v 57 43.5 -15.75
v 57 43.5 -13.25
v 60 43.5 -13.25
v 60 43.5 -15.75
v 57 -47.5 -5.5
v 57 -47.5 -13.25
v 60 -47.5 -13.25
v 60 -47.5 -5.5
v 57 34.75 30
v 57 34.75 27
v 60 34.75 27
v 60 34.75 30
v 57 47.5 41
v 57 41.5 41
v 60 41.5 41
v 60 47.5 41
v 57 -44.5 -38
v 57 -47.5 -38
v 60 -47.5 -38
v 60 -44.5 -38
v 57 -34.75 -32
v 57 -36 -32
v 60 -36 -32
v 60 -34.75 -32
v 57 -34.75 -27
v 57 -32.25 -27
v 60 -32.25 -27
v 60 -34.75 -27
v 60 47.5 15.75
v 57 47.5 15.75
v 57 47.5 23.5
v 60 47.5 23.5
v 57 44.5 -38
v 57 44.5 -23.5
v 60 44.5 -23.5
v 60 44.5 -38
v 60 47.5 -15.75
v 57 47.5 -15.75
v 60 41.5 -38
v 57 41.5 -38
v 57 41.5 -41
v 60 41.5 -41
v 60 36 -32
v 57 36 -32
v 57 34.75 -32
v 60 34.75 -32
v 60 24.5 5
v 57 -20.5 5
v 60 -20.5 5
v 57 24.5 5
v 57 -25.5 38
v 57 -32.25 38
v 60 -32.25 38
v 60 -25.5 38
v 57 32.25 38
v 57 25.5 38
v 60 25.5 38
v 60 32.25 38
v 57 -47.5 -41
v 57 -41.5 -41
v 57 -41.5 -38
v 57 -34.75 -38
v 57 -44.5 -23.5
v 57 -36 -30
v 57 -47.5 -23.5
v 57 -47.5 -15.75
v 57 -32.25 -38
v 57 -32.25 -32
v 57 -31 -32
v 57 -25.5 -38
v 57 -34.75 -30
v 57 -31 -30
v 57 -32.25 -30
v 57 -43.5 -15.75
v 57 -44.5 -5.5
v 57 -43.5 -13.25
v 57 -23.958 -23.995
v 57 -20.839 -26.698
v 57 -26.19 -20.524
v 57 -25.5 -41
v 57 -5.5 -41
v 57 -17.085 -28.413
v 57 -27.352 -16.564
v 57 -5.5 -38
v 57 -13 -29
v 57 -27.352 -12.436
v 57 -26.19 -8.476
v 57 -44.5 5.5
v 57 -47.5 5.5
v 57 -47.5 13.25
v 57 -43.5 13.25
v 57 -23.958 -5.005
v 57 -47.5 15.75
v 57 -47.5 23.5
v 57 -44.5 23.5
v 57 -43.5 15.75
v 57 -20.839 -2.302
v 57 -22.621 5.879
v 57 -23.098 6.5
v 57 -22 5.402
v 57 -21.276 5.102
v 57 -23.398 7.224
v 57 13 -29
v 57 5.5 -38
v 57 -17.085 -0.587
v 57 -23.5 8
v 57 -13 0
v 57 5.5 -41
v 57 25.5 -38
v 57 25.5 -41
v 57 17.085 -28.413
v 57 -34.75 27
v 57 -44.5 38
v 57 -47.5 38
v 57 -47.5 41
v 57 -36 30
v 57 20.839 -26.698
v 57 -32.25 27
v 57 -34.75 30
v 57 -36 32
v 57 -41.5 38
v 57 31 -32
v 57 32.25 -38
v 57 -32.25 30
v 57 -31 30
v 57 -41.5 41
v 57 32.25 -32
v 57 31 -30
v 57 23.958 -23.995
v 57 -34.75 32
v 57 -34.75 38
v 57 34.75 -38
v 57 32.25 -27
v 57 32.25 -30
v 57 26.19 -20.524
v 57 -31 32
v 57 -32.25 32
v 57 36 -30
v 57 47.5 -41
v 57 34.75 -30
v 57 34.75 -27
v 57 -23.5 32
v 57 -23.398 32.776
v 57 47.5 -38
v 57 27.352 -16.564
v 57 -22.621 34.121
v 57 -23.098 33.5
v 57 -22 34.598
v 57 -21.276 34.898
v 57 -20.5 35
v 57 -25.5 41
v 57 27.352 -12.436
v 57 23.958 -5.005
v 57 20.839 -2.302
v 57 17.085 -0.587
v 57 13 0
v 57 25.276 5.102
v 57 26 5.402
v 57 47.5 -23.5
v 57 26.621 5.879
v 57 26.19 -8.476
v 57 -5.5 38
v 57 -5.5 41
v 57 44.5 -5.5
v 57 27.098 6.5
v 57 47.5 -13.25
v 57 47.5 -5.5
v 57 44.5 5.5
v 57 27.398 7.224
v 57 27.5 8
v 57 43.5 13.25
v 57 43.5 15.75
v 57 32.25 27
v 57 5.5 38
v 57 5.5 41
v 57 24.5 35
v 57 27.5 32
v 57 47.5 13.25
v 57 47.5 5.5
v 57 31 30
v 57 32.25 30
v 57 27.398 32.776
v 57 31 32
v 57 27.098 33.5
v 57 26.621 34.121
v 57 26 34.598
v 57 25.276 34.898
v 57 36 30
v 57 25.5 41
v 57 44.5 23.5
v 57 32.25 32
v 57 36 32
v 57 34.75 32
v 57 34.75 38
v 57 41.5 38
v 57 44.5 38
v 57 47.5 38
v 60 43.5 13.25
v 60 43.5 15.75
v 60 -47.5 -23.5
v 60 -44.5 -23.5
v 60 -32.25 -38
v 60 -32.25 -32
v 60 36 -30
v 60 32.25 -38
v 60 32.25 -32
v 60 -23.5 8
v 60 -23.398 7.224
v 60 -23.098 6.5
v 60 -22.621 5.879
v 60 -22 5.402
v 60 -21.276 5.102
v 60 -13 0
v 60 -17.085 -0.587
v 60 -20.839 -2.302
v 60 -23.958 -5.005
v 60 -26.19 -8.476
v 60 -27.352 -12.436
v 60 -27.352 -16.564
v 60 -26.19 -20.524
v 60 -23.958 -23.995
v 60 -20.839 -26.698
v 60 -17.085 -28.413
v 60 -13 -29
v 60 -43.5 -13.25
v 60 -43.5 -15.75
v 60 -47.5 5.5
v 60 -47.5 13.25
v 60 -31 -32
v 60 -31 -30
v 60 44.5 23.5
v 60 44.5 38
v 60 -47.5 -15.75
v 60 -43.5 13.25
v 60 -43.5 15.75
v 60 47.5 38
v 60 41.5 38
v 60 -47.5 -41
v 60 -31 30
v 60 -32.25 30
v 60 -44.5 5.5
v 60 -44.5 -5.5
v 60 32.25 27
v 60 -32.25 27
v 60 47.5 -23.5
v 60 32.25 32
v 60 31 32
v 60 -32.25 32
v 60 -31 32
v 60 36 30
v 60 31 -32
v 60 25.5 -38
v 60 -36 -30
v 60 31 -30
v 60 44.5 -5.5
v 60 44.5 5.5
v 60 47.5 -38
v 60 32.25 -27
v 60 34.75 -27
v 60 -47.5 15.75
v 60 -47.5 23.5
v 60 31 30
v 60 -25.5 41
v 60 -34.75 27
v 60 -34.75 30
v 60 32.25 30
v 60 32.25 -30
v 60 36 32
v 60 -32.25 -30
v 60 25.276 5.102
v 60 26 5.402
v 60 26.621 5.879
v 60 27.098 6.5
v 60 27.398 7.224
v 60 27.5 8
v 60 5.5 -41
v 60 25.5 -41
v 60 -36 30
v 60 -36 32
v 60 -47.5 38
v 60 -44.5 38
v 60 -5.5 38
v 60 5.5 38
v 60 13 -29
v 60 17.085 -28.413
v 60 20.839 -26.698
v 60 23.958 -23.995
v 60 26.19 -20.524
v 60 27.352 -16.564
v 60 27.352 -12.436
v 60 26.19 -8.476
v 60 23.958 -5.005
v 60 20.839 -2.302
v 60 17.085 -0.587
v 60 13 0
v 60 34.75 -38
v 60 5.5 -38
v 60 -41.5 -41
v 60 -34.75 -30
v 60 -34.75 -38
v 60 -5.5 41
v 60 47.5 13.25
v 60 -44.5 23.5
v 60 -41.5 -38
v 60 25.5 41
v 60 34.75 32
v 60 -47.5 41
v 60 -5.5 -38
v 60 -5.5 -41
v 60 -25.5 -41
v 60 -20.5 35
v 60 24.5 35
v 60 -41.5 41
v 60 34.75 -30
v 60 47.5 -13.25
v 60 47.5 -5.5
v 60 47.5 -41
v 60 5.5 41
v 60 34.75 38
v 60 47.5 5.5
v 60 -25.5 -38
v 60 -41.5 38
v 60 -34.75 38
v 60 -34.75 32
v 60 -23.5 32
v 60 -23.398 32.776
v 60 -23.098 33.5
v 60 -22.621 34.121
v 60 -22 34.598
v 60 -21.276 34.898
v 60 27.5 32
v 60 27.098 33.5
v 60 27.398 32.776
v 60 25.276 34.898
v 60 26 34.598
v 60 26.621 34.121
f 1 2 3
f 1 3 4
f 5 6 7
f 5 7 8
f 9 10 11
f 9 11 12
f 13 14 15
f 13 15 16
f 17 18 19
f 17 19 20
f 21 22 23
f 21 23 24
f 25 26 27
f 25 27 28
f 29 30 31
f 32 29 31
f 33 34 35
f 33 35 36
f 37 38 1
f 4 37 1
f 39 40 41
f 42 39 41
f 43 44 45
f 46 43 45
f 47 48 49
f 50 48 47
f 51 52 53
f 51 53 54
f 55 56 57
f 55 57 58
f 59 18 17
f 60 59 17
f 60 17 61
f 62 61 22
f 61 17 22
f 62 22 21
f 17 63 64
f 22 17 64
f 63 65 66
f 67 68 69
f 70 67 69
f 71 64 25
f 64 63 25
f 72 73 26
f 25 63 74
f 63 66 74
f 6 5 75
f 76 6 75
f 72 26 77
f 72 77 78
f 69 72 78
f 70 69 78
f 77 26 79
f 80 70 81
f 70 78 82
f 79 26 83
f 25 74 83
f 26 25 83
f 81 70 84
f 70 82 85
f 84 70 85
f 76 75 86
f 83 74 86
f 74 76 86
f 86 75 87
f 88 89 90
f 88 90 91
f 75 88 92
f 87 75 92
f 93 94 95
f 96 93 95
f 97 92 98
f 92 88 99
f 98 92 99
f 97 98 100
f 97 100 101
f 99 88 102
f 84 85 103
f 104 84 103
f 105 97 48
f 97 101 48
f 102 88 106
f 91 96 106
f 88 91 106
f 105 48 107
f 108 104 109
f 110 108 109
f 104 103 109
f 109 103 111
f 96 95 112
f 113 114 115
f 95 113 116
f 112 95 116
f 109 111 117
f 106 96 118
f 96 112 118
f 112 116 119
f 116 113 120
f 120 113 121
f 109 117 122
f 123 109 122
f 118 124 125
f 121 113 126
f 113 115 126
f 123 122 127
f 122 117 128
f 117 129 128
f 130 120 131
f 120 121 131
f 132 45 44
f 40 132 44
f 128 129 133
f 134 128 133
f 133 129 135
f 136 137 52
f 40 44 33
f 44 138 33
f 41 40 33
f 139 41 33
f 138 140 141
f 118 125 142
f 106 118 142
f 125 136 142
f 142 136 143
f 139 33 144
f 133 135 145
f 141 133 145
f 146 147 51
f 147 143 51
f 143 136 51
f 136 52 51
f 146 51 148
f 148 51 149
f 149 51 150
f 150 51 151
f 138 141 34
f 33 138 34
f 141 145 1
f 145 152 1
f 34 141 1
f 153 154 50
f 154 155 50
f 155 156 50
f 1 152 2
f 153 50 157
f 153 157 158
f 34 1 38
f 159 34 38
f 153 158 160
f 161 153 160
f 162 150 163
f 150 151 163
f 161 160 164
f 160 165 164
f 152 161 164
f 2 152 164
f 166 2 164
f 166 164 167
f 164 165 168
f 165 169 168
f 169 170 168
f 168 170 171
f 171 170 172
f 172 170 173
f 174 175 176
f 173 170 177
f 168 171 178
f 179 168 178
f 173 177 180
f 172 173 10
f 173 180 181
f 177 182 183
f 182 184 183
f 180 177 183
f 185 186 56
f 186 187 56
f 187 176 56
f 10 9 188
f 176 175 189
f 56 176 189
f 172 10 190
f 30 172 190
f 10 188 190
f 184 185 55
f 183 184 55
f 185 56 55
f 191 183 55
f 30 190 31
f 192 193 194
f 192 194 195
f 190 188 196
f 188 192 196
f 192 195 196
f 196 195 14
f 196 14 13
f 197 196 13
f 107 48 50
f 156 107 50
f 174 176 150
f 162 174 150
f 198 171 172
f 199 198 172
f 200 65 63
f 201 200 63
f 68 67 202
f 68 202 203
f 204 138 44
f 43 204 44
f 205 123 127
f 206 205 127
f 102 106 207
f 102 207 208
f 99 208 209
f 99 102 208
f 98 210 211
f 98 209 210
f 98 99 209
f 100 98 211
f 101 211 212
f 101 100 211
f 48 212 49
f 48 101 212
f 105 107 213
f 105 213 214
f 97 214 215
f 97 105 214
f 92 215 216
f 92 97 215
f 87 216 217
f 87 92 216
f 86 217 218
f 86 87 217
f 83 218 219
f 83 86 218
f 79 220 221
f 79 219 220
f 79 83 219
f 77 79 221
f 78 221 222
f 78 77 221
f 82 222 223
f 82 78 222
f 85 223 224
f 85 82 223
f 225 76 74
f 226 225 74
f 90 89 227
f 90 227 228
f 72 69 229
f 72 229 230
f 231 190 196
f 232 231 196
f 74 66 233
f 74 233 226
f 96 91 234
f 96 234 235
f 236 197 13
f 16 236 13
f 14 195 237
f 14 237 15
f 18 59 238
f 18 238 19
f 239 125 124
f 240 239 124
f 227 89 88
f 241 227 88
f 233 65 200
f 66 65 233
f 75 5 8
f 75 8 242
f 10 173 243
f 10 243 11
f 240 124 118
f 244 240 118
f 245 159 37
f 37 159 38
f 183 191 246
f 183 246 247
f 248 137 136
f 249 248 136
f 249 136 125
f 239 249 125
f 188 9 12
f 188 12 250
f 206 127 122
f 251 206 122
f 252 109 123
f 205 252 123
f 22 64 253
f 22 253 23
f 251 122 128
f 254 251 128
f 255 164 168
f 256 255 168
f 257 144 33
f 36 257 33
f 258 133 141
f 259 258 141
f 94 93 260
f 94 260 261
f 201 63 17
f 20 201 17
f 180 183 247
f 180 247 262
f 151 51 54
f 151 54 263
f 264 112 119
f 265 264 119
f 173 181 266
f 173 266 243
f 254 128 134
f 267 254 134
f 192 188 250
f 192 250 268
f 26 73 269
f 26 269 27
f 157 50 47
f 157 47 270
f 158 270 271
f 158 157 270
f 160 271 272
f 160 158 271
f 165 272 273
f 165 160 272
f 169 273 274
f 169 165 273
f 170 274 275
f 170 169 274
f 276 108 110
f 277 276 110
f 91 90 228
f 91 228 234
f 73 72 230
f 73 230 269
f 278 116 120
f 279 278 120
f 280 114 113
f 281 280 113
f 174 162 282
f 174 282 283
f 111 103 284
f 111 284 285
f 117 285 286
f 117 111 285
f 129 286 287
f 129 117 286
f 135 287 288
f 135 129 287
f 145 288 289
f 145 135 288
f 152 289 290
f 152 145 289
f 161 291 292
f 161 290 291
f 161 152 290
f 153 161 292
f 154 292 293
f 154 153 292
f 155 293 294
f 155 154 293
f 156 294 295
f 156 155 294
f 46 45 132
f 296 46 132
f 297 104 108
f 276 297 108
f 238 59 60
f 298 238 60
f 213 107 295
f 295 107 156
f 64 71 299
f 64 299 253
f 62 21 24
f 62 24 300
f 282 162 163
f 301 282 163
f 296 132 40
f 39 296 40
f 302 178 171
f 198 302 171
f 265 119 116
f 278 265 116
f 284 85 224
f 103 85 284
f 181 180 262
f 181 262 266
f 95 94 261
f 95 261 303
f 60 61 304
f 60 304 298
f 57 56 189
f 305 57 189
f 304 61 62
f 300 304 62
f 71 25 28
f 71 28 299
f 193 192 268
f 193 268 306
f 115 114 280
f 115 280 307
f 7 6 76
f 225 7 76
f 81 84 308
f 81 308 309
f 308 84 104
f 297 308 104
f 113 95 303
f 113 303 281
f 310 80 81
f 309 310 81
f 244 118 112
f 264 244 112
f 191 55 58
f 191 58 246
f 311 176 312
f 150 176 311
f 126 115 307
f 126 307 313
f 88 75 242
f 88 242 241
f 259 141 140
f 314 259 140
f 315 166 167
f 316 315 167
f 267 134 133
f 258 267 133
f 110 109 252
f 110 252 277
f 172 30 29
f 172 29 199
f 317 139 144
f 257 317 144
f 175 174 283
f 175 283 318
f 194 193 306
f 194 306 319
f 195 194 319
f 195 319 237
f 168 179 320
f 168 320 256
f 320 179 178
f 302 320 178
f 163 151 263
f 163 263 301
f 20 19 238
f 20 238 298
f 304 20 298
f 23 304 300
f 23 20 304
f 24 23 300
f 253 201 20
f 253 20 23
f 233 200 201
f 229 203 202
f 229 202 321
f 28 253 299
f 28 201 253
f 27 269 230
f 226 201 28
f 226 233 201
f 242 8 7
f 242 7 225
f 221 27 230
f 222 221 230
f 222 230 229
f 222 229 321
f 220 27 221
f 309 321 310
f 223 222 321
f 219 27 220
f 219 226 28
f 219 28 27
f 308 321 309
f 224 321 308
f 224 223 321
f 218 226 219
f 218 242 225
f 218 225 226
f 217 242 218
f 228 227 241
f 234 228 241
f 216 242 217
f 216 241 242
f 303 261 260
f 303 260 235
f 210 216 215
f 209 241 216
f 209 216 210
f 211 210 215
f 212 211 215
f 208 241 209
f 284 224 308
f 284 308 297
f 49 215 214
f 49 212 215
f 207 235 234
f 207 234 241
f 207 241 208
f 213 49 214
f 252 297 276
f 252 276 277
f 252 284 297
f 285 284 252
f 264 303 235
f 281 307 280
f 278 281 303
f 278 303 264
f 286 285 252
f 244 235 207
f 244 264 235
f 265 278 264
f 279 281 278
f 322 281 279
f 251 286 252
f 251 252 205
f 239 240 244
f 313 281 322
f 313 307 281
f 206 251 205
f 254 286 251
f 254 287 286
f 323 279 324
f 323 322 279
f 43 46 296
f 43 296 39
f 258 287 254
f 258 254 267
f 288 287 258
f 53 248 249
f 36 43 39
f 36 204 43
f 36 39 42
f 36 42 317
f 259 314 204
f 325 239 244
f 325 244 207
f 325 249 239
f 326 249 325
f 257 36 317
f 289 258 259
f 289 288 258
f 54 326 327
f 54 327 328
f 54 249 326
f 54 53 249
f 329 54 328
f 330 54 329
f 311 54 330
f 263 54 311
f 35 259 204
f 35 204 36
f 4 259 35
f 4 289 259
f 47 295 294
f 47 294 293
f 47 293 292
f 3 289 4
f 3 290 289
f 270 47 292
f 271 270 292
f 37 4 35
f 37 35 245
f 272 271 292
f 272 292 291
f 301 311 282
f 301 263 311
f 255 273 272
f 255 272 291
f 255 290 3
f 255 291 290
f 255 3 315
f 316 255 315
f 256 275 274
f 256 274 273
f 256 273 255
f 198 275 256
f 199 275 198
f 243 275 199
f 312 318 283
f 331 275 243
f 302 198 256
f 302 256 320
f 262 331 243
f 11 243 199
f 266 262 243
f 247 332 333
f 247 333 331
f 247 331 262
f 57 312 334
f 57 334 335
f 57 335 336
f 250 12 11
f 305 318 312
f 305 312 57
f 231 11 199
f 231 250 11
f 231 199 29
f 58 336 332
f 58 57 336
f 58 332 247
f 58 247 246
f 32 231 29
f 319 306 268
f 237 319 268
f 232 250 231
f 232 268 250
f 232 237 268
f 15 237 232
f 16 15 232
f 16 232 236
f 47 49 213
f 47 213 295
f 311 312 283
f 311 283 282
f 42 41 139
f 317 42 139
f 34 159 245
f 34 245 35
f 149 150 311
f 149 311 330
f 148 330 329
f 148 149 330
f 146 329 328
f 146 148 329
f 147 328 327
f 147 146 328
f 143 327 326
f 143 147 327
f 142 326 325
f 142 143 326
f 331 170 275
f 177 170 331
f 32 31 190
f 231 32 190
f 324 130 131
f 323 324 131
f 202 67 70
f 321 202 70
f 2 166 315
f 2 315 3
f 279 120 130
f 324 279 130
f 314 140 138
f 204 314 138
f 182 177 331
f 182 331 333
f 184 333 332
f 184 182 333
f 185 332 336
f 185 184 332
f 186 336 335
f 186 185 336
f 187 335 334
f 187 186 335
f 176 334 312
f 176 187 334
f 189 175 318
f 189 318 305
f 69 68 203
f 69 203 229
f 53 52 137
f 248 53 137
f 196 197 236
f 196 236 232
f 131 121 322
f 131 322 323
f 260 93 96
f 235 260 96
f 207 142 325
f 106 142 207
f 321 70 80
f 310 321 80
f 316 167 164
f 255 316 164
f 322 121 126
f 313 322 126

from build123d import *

# Parameters (mm, degrees)
SKETCH020_W                   = 95
SKETCH020_H                   = 82
PAD005_DEPTH                  = 3
SKETCH021_W                   = 11
SKETCH021_H                   = 3
SKETCH021_W_2                 = 16
SKETCH021_W_3                 = 3
SKETCH021_H_2                 = 14.5
SKETCH021_H_3                 = 11
POCKET015_DEPTH               = 254.062745
SKETCH021_MIRRORED019_2_W     = 11
SKETCH021_MIRRORED019_2_H     = 3
SKETCH021_MIRRORED019_2_W_2   = 16
SKETCH021_MIRRORED019_2_W_3   = 3
SKETCH021_MIRRORED019_2_H_2   = 14.5
SKETCH021_MIRRORED019_2_H_3   = 11
POCKET015_MIRRORED019_2_DEPTH = 254.062745
SKETCH022_W                   = 4
SKETCH022_H                   = 2.5
POCKET016_DEPTH               = 254.062745
POCKET017_DEPTH               = 3.001
SKETCH022_MIRRORED026_2_W     = 4
SKETCH022_MIRRORED026_2_H     = 2.5
POCKET016_MIRRORED026_2_DEPTH = 254.062745


with BuildPart() as part:
    # Sketch020 → Pad005 (new body)
    with BuildSketch(Plane.YZ):
        Rectangle(SKETCH020_W, SKETCH020_H)
    extrude(amount=PAD005_DEPTH)

    # Sketch021 → Pocket015 (cut, through all)
    with BuildSketch(Plane.YZ):
        with Locations((0, 39.5)):
            Rectangle(SKETCH021_W, SKETCH021_H)
        with Locations((-33.5, 39.5)):
            Rectangle(SKETCH021_W_2, SKETCH021_H)
        with Locations((33.5, 39.5)):
            Rectangle(SKETCH021_W_2, SKETCH021_H)
        with Locations((-46, 30.75)):
            Rectangle(SKETCH021_W_3, SKETCH021_H_2)
        with Locations((-46, 0)):
            Rectangle(SKETCH021_W_3, SKETCH021_H_3)
    pocket015 = extrude(amount=POCKET015_DEPTH, mode=Mode.SUBTRACT)

    # Sketch021 Mirrored019 2 → Pocket015 Mirrored019 2 (cut, through all)
    with BuildSketch(Plane(origin=(0, 0, 0), x_dir=(0, 1, 0), z_dir=(-1, 0, 0))):
        with Locations((0, 39.5)):
            Rectangle(SKETCH021_MIRRORED019_2_W, SKETCH021_MIRRORED019_2_H)
        with Locations((-33.5, 39.5)):
            Rectangle(SKETCH021_MIRRORED019_2_W_2, SKETCH021_MIRRORED019_2_H)
        with Locations((33.5, 39.5)):
            Rectangle(SKETCH021_MIRRORED019_2_W_2, SKETCH021_MIRRORED019_2_H)
        with Locations((-46, 30.75)):
            Rectangle(SKETCH021_MIRRORED019_2_W_3, SKETCH021_MIRRORED019_2_H_2)
        with Locations((-46, 0)):
            Rectangle(SKETCH021_MIRRORED019_2_W_3, SKETCH021_MIRRORED019_2_H_3)
    pocket015_mirrored019_2 = extrude(amount=-POCKET015_MIRRORED019_2_DEPTH, mode=Mode.SUBTRACT)

    # Mirrored028: Pocket015, Pocket015 Mirrored019 2 across Sketch021 V_Axis
    add(pocket015.mirror(Plane(origin=(0, 0, 0), x_dir=(1, 0, 0), z_dir=(0, 1, 0))), mode=Mode.SUBTRACT)
    add(pocket015_mirrored019_2.mirror(Plane(origin=(0, 0, 0), x_dir=(1, 0, 0), z_dir=(0, 1, 0))), mode=Mode.SUBTRACT)

    # Sketch022 → Pocket016 (cut, through all)
    with BuildSketch(Plane.YZ):
        Polygon((-32.25, 41), (-32.25, 32), (-31, 32), (-31, 30), (-32.25, 30), (-32.25, 27), (-34.75, 27), (-34.75, 30), (-36, 30), (-36, 32), (-34.75, 32), (-34.75, 41), align=None)
        with Locations((-45.5, 14.5)):
            Rectangle(SKETCH022_W, SKETCH022_H)
    pocket016 = extrude(amount=POCKET016_DEPTH, mode=Mode.SUBTRACT)

    # Sketch023 → Pocket017 (cut, through all)
    with BuildSketch(Plane.YZ):
        with BuildLine():
            Line((-20.5, 5), (24.5, 5))
            ThreePointArc((24.5, 5), (26.62132, 5.87868), (27.5, 8))
            Line((27.5, 8), (27.5, 32))
            ThreePointArc((27.5, 32), (26.62132, 34.12132), (24.5, 35))
            Line((24.5, 35), (-20.5, 35))
            ThreePointArc((-20.5, 35), (-22.62132, 34.12132), (-23.5, 32))
            Line((-23.5, 32), (-23.5, 8))
            ThreePointArc((-23.5, 8), (-22.62132, 5.87868), (-20.5, 5))
        make_face()
        with BuildLine():
            ThreePointArc((-13, 0), (-27.5, -14.5), (-13, -29))
            Line((-13, -29), (13, -29))
            ThreePointArc((13, -29), (27.5, -14.5), (13, 0))
            Line((-13, 0), (13, 0))
        make_face()
    extrude(amount=POCKET017_DEPTH, mode=Mode.SUBTRACT)

    # Sketch022 Mirrored026 2 → Pocket016 Mirrored026 2 (cut, through all)
    with BuildSketch(Plane(origin=(0, 0, 0), x_dir=(0, -1, 0), z_dir=(-1, 0, 0))):
        Polygon((-32.25, 41), (-32.25, 32), (-31, 32), (-31, 30), (-32.25, 30), (-32.25, 27), (-34.75, 27), (-34.75, 30), (-36, 30), (-36, 32), (-34.75, 32), (-34.75, 41), align=None)
        with Locations((-45.5, 14.5)):
            Rectangle(SKETCH022_MIRRORED026_2_W, SKETCH022_MIRRORED026_2_H)
    pocket016_mirrored026_2 = extrude(amount=-POCKET016_MIRRORED026_2_DEPTH, mode=Mode.SUBTRACT)

    # Mirrored027: Pocket016, Pocket016 Mirrored026 2 across Sketch022 H_Axis
    add(pocket016.mirror(Plane.XY), mode=Mode.SUBTRACT)
    add(pocket016_mirrored026_2.mirror(Plane.XY), mode=Mode.SUBTRACT)


with BuildPart() as part_1:
    # Body005 placement: moved
    add(part.part.moved(Location((57, 0, 0))))


solid = part_1.part
